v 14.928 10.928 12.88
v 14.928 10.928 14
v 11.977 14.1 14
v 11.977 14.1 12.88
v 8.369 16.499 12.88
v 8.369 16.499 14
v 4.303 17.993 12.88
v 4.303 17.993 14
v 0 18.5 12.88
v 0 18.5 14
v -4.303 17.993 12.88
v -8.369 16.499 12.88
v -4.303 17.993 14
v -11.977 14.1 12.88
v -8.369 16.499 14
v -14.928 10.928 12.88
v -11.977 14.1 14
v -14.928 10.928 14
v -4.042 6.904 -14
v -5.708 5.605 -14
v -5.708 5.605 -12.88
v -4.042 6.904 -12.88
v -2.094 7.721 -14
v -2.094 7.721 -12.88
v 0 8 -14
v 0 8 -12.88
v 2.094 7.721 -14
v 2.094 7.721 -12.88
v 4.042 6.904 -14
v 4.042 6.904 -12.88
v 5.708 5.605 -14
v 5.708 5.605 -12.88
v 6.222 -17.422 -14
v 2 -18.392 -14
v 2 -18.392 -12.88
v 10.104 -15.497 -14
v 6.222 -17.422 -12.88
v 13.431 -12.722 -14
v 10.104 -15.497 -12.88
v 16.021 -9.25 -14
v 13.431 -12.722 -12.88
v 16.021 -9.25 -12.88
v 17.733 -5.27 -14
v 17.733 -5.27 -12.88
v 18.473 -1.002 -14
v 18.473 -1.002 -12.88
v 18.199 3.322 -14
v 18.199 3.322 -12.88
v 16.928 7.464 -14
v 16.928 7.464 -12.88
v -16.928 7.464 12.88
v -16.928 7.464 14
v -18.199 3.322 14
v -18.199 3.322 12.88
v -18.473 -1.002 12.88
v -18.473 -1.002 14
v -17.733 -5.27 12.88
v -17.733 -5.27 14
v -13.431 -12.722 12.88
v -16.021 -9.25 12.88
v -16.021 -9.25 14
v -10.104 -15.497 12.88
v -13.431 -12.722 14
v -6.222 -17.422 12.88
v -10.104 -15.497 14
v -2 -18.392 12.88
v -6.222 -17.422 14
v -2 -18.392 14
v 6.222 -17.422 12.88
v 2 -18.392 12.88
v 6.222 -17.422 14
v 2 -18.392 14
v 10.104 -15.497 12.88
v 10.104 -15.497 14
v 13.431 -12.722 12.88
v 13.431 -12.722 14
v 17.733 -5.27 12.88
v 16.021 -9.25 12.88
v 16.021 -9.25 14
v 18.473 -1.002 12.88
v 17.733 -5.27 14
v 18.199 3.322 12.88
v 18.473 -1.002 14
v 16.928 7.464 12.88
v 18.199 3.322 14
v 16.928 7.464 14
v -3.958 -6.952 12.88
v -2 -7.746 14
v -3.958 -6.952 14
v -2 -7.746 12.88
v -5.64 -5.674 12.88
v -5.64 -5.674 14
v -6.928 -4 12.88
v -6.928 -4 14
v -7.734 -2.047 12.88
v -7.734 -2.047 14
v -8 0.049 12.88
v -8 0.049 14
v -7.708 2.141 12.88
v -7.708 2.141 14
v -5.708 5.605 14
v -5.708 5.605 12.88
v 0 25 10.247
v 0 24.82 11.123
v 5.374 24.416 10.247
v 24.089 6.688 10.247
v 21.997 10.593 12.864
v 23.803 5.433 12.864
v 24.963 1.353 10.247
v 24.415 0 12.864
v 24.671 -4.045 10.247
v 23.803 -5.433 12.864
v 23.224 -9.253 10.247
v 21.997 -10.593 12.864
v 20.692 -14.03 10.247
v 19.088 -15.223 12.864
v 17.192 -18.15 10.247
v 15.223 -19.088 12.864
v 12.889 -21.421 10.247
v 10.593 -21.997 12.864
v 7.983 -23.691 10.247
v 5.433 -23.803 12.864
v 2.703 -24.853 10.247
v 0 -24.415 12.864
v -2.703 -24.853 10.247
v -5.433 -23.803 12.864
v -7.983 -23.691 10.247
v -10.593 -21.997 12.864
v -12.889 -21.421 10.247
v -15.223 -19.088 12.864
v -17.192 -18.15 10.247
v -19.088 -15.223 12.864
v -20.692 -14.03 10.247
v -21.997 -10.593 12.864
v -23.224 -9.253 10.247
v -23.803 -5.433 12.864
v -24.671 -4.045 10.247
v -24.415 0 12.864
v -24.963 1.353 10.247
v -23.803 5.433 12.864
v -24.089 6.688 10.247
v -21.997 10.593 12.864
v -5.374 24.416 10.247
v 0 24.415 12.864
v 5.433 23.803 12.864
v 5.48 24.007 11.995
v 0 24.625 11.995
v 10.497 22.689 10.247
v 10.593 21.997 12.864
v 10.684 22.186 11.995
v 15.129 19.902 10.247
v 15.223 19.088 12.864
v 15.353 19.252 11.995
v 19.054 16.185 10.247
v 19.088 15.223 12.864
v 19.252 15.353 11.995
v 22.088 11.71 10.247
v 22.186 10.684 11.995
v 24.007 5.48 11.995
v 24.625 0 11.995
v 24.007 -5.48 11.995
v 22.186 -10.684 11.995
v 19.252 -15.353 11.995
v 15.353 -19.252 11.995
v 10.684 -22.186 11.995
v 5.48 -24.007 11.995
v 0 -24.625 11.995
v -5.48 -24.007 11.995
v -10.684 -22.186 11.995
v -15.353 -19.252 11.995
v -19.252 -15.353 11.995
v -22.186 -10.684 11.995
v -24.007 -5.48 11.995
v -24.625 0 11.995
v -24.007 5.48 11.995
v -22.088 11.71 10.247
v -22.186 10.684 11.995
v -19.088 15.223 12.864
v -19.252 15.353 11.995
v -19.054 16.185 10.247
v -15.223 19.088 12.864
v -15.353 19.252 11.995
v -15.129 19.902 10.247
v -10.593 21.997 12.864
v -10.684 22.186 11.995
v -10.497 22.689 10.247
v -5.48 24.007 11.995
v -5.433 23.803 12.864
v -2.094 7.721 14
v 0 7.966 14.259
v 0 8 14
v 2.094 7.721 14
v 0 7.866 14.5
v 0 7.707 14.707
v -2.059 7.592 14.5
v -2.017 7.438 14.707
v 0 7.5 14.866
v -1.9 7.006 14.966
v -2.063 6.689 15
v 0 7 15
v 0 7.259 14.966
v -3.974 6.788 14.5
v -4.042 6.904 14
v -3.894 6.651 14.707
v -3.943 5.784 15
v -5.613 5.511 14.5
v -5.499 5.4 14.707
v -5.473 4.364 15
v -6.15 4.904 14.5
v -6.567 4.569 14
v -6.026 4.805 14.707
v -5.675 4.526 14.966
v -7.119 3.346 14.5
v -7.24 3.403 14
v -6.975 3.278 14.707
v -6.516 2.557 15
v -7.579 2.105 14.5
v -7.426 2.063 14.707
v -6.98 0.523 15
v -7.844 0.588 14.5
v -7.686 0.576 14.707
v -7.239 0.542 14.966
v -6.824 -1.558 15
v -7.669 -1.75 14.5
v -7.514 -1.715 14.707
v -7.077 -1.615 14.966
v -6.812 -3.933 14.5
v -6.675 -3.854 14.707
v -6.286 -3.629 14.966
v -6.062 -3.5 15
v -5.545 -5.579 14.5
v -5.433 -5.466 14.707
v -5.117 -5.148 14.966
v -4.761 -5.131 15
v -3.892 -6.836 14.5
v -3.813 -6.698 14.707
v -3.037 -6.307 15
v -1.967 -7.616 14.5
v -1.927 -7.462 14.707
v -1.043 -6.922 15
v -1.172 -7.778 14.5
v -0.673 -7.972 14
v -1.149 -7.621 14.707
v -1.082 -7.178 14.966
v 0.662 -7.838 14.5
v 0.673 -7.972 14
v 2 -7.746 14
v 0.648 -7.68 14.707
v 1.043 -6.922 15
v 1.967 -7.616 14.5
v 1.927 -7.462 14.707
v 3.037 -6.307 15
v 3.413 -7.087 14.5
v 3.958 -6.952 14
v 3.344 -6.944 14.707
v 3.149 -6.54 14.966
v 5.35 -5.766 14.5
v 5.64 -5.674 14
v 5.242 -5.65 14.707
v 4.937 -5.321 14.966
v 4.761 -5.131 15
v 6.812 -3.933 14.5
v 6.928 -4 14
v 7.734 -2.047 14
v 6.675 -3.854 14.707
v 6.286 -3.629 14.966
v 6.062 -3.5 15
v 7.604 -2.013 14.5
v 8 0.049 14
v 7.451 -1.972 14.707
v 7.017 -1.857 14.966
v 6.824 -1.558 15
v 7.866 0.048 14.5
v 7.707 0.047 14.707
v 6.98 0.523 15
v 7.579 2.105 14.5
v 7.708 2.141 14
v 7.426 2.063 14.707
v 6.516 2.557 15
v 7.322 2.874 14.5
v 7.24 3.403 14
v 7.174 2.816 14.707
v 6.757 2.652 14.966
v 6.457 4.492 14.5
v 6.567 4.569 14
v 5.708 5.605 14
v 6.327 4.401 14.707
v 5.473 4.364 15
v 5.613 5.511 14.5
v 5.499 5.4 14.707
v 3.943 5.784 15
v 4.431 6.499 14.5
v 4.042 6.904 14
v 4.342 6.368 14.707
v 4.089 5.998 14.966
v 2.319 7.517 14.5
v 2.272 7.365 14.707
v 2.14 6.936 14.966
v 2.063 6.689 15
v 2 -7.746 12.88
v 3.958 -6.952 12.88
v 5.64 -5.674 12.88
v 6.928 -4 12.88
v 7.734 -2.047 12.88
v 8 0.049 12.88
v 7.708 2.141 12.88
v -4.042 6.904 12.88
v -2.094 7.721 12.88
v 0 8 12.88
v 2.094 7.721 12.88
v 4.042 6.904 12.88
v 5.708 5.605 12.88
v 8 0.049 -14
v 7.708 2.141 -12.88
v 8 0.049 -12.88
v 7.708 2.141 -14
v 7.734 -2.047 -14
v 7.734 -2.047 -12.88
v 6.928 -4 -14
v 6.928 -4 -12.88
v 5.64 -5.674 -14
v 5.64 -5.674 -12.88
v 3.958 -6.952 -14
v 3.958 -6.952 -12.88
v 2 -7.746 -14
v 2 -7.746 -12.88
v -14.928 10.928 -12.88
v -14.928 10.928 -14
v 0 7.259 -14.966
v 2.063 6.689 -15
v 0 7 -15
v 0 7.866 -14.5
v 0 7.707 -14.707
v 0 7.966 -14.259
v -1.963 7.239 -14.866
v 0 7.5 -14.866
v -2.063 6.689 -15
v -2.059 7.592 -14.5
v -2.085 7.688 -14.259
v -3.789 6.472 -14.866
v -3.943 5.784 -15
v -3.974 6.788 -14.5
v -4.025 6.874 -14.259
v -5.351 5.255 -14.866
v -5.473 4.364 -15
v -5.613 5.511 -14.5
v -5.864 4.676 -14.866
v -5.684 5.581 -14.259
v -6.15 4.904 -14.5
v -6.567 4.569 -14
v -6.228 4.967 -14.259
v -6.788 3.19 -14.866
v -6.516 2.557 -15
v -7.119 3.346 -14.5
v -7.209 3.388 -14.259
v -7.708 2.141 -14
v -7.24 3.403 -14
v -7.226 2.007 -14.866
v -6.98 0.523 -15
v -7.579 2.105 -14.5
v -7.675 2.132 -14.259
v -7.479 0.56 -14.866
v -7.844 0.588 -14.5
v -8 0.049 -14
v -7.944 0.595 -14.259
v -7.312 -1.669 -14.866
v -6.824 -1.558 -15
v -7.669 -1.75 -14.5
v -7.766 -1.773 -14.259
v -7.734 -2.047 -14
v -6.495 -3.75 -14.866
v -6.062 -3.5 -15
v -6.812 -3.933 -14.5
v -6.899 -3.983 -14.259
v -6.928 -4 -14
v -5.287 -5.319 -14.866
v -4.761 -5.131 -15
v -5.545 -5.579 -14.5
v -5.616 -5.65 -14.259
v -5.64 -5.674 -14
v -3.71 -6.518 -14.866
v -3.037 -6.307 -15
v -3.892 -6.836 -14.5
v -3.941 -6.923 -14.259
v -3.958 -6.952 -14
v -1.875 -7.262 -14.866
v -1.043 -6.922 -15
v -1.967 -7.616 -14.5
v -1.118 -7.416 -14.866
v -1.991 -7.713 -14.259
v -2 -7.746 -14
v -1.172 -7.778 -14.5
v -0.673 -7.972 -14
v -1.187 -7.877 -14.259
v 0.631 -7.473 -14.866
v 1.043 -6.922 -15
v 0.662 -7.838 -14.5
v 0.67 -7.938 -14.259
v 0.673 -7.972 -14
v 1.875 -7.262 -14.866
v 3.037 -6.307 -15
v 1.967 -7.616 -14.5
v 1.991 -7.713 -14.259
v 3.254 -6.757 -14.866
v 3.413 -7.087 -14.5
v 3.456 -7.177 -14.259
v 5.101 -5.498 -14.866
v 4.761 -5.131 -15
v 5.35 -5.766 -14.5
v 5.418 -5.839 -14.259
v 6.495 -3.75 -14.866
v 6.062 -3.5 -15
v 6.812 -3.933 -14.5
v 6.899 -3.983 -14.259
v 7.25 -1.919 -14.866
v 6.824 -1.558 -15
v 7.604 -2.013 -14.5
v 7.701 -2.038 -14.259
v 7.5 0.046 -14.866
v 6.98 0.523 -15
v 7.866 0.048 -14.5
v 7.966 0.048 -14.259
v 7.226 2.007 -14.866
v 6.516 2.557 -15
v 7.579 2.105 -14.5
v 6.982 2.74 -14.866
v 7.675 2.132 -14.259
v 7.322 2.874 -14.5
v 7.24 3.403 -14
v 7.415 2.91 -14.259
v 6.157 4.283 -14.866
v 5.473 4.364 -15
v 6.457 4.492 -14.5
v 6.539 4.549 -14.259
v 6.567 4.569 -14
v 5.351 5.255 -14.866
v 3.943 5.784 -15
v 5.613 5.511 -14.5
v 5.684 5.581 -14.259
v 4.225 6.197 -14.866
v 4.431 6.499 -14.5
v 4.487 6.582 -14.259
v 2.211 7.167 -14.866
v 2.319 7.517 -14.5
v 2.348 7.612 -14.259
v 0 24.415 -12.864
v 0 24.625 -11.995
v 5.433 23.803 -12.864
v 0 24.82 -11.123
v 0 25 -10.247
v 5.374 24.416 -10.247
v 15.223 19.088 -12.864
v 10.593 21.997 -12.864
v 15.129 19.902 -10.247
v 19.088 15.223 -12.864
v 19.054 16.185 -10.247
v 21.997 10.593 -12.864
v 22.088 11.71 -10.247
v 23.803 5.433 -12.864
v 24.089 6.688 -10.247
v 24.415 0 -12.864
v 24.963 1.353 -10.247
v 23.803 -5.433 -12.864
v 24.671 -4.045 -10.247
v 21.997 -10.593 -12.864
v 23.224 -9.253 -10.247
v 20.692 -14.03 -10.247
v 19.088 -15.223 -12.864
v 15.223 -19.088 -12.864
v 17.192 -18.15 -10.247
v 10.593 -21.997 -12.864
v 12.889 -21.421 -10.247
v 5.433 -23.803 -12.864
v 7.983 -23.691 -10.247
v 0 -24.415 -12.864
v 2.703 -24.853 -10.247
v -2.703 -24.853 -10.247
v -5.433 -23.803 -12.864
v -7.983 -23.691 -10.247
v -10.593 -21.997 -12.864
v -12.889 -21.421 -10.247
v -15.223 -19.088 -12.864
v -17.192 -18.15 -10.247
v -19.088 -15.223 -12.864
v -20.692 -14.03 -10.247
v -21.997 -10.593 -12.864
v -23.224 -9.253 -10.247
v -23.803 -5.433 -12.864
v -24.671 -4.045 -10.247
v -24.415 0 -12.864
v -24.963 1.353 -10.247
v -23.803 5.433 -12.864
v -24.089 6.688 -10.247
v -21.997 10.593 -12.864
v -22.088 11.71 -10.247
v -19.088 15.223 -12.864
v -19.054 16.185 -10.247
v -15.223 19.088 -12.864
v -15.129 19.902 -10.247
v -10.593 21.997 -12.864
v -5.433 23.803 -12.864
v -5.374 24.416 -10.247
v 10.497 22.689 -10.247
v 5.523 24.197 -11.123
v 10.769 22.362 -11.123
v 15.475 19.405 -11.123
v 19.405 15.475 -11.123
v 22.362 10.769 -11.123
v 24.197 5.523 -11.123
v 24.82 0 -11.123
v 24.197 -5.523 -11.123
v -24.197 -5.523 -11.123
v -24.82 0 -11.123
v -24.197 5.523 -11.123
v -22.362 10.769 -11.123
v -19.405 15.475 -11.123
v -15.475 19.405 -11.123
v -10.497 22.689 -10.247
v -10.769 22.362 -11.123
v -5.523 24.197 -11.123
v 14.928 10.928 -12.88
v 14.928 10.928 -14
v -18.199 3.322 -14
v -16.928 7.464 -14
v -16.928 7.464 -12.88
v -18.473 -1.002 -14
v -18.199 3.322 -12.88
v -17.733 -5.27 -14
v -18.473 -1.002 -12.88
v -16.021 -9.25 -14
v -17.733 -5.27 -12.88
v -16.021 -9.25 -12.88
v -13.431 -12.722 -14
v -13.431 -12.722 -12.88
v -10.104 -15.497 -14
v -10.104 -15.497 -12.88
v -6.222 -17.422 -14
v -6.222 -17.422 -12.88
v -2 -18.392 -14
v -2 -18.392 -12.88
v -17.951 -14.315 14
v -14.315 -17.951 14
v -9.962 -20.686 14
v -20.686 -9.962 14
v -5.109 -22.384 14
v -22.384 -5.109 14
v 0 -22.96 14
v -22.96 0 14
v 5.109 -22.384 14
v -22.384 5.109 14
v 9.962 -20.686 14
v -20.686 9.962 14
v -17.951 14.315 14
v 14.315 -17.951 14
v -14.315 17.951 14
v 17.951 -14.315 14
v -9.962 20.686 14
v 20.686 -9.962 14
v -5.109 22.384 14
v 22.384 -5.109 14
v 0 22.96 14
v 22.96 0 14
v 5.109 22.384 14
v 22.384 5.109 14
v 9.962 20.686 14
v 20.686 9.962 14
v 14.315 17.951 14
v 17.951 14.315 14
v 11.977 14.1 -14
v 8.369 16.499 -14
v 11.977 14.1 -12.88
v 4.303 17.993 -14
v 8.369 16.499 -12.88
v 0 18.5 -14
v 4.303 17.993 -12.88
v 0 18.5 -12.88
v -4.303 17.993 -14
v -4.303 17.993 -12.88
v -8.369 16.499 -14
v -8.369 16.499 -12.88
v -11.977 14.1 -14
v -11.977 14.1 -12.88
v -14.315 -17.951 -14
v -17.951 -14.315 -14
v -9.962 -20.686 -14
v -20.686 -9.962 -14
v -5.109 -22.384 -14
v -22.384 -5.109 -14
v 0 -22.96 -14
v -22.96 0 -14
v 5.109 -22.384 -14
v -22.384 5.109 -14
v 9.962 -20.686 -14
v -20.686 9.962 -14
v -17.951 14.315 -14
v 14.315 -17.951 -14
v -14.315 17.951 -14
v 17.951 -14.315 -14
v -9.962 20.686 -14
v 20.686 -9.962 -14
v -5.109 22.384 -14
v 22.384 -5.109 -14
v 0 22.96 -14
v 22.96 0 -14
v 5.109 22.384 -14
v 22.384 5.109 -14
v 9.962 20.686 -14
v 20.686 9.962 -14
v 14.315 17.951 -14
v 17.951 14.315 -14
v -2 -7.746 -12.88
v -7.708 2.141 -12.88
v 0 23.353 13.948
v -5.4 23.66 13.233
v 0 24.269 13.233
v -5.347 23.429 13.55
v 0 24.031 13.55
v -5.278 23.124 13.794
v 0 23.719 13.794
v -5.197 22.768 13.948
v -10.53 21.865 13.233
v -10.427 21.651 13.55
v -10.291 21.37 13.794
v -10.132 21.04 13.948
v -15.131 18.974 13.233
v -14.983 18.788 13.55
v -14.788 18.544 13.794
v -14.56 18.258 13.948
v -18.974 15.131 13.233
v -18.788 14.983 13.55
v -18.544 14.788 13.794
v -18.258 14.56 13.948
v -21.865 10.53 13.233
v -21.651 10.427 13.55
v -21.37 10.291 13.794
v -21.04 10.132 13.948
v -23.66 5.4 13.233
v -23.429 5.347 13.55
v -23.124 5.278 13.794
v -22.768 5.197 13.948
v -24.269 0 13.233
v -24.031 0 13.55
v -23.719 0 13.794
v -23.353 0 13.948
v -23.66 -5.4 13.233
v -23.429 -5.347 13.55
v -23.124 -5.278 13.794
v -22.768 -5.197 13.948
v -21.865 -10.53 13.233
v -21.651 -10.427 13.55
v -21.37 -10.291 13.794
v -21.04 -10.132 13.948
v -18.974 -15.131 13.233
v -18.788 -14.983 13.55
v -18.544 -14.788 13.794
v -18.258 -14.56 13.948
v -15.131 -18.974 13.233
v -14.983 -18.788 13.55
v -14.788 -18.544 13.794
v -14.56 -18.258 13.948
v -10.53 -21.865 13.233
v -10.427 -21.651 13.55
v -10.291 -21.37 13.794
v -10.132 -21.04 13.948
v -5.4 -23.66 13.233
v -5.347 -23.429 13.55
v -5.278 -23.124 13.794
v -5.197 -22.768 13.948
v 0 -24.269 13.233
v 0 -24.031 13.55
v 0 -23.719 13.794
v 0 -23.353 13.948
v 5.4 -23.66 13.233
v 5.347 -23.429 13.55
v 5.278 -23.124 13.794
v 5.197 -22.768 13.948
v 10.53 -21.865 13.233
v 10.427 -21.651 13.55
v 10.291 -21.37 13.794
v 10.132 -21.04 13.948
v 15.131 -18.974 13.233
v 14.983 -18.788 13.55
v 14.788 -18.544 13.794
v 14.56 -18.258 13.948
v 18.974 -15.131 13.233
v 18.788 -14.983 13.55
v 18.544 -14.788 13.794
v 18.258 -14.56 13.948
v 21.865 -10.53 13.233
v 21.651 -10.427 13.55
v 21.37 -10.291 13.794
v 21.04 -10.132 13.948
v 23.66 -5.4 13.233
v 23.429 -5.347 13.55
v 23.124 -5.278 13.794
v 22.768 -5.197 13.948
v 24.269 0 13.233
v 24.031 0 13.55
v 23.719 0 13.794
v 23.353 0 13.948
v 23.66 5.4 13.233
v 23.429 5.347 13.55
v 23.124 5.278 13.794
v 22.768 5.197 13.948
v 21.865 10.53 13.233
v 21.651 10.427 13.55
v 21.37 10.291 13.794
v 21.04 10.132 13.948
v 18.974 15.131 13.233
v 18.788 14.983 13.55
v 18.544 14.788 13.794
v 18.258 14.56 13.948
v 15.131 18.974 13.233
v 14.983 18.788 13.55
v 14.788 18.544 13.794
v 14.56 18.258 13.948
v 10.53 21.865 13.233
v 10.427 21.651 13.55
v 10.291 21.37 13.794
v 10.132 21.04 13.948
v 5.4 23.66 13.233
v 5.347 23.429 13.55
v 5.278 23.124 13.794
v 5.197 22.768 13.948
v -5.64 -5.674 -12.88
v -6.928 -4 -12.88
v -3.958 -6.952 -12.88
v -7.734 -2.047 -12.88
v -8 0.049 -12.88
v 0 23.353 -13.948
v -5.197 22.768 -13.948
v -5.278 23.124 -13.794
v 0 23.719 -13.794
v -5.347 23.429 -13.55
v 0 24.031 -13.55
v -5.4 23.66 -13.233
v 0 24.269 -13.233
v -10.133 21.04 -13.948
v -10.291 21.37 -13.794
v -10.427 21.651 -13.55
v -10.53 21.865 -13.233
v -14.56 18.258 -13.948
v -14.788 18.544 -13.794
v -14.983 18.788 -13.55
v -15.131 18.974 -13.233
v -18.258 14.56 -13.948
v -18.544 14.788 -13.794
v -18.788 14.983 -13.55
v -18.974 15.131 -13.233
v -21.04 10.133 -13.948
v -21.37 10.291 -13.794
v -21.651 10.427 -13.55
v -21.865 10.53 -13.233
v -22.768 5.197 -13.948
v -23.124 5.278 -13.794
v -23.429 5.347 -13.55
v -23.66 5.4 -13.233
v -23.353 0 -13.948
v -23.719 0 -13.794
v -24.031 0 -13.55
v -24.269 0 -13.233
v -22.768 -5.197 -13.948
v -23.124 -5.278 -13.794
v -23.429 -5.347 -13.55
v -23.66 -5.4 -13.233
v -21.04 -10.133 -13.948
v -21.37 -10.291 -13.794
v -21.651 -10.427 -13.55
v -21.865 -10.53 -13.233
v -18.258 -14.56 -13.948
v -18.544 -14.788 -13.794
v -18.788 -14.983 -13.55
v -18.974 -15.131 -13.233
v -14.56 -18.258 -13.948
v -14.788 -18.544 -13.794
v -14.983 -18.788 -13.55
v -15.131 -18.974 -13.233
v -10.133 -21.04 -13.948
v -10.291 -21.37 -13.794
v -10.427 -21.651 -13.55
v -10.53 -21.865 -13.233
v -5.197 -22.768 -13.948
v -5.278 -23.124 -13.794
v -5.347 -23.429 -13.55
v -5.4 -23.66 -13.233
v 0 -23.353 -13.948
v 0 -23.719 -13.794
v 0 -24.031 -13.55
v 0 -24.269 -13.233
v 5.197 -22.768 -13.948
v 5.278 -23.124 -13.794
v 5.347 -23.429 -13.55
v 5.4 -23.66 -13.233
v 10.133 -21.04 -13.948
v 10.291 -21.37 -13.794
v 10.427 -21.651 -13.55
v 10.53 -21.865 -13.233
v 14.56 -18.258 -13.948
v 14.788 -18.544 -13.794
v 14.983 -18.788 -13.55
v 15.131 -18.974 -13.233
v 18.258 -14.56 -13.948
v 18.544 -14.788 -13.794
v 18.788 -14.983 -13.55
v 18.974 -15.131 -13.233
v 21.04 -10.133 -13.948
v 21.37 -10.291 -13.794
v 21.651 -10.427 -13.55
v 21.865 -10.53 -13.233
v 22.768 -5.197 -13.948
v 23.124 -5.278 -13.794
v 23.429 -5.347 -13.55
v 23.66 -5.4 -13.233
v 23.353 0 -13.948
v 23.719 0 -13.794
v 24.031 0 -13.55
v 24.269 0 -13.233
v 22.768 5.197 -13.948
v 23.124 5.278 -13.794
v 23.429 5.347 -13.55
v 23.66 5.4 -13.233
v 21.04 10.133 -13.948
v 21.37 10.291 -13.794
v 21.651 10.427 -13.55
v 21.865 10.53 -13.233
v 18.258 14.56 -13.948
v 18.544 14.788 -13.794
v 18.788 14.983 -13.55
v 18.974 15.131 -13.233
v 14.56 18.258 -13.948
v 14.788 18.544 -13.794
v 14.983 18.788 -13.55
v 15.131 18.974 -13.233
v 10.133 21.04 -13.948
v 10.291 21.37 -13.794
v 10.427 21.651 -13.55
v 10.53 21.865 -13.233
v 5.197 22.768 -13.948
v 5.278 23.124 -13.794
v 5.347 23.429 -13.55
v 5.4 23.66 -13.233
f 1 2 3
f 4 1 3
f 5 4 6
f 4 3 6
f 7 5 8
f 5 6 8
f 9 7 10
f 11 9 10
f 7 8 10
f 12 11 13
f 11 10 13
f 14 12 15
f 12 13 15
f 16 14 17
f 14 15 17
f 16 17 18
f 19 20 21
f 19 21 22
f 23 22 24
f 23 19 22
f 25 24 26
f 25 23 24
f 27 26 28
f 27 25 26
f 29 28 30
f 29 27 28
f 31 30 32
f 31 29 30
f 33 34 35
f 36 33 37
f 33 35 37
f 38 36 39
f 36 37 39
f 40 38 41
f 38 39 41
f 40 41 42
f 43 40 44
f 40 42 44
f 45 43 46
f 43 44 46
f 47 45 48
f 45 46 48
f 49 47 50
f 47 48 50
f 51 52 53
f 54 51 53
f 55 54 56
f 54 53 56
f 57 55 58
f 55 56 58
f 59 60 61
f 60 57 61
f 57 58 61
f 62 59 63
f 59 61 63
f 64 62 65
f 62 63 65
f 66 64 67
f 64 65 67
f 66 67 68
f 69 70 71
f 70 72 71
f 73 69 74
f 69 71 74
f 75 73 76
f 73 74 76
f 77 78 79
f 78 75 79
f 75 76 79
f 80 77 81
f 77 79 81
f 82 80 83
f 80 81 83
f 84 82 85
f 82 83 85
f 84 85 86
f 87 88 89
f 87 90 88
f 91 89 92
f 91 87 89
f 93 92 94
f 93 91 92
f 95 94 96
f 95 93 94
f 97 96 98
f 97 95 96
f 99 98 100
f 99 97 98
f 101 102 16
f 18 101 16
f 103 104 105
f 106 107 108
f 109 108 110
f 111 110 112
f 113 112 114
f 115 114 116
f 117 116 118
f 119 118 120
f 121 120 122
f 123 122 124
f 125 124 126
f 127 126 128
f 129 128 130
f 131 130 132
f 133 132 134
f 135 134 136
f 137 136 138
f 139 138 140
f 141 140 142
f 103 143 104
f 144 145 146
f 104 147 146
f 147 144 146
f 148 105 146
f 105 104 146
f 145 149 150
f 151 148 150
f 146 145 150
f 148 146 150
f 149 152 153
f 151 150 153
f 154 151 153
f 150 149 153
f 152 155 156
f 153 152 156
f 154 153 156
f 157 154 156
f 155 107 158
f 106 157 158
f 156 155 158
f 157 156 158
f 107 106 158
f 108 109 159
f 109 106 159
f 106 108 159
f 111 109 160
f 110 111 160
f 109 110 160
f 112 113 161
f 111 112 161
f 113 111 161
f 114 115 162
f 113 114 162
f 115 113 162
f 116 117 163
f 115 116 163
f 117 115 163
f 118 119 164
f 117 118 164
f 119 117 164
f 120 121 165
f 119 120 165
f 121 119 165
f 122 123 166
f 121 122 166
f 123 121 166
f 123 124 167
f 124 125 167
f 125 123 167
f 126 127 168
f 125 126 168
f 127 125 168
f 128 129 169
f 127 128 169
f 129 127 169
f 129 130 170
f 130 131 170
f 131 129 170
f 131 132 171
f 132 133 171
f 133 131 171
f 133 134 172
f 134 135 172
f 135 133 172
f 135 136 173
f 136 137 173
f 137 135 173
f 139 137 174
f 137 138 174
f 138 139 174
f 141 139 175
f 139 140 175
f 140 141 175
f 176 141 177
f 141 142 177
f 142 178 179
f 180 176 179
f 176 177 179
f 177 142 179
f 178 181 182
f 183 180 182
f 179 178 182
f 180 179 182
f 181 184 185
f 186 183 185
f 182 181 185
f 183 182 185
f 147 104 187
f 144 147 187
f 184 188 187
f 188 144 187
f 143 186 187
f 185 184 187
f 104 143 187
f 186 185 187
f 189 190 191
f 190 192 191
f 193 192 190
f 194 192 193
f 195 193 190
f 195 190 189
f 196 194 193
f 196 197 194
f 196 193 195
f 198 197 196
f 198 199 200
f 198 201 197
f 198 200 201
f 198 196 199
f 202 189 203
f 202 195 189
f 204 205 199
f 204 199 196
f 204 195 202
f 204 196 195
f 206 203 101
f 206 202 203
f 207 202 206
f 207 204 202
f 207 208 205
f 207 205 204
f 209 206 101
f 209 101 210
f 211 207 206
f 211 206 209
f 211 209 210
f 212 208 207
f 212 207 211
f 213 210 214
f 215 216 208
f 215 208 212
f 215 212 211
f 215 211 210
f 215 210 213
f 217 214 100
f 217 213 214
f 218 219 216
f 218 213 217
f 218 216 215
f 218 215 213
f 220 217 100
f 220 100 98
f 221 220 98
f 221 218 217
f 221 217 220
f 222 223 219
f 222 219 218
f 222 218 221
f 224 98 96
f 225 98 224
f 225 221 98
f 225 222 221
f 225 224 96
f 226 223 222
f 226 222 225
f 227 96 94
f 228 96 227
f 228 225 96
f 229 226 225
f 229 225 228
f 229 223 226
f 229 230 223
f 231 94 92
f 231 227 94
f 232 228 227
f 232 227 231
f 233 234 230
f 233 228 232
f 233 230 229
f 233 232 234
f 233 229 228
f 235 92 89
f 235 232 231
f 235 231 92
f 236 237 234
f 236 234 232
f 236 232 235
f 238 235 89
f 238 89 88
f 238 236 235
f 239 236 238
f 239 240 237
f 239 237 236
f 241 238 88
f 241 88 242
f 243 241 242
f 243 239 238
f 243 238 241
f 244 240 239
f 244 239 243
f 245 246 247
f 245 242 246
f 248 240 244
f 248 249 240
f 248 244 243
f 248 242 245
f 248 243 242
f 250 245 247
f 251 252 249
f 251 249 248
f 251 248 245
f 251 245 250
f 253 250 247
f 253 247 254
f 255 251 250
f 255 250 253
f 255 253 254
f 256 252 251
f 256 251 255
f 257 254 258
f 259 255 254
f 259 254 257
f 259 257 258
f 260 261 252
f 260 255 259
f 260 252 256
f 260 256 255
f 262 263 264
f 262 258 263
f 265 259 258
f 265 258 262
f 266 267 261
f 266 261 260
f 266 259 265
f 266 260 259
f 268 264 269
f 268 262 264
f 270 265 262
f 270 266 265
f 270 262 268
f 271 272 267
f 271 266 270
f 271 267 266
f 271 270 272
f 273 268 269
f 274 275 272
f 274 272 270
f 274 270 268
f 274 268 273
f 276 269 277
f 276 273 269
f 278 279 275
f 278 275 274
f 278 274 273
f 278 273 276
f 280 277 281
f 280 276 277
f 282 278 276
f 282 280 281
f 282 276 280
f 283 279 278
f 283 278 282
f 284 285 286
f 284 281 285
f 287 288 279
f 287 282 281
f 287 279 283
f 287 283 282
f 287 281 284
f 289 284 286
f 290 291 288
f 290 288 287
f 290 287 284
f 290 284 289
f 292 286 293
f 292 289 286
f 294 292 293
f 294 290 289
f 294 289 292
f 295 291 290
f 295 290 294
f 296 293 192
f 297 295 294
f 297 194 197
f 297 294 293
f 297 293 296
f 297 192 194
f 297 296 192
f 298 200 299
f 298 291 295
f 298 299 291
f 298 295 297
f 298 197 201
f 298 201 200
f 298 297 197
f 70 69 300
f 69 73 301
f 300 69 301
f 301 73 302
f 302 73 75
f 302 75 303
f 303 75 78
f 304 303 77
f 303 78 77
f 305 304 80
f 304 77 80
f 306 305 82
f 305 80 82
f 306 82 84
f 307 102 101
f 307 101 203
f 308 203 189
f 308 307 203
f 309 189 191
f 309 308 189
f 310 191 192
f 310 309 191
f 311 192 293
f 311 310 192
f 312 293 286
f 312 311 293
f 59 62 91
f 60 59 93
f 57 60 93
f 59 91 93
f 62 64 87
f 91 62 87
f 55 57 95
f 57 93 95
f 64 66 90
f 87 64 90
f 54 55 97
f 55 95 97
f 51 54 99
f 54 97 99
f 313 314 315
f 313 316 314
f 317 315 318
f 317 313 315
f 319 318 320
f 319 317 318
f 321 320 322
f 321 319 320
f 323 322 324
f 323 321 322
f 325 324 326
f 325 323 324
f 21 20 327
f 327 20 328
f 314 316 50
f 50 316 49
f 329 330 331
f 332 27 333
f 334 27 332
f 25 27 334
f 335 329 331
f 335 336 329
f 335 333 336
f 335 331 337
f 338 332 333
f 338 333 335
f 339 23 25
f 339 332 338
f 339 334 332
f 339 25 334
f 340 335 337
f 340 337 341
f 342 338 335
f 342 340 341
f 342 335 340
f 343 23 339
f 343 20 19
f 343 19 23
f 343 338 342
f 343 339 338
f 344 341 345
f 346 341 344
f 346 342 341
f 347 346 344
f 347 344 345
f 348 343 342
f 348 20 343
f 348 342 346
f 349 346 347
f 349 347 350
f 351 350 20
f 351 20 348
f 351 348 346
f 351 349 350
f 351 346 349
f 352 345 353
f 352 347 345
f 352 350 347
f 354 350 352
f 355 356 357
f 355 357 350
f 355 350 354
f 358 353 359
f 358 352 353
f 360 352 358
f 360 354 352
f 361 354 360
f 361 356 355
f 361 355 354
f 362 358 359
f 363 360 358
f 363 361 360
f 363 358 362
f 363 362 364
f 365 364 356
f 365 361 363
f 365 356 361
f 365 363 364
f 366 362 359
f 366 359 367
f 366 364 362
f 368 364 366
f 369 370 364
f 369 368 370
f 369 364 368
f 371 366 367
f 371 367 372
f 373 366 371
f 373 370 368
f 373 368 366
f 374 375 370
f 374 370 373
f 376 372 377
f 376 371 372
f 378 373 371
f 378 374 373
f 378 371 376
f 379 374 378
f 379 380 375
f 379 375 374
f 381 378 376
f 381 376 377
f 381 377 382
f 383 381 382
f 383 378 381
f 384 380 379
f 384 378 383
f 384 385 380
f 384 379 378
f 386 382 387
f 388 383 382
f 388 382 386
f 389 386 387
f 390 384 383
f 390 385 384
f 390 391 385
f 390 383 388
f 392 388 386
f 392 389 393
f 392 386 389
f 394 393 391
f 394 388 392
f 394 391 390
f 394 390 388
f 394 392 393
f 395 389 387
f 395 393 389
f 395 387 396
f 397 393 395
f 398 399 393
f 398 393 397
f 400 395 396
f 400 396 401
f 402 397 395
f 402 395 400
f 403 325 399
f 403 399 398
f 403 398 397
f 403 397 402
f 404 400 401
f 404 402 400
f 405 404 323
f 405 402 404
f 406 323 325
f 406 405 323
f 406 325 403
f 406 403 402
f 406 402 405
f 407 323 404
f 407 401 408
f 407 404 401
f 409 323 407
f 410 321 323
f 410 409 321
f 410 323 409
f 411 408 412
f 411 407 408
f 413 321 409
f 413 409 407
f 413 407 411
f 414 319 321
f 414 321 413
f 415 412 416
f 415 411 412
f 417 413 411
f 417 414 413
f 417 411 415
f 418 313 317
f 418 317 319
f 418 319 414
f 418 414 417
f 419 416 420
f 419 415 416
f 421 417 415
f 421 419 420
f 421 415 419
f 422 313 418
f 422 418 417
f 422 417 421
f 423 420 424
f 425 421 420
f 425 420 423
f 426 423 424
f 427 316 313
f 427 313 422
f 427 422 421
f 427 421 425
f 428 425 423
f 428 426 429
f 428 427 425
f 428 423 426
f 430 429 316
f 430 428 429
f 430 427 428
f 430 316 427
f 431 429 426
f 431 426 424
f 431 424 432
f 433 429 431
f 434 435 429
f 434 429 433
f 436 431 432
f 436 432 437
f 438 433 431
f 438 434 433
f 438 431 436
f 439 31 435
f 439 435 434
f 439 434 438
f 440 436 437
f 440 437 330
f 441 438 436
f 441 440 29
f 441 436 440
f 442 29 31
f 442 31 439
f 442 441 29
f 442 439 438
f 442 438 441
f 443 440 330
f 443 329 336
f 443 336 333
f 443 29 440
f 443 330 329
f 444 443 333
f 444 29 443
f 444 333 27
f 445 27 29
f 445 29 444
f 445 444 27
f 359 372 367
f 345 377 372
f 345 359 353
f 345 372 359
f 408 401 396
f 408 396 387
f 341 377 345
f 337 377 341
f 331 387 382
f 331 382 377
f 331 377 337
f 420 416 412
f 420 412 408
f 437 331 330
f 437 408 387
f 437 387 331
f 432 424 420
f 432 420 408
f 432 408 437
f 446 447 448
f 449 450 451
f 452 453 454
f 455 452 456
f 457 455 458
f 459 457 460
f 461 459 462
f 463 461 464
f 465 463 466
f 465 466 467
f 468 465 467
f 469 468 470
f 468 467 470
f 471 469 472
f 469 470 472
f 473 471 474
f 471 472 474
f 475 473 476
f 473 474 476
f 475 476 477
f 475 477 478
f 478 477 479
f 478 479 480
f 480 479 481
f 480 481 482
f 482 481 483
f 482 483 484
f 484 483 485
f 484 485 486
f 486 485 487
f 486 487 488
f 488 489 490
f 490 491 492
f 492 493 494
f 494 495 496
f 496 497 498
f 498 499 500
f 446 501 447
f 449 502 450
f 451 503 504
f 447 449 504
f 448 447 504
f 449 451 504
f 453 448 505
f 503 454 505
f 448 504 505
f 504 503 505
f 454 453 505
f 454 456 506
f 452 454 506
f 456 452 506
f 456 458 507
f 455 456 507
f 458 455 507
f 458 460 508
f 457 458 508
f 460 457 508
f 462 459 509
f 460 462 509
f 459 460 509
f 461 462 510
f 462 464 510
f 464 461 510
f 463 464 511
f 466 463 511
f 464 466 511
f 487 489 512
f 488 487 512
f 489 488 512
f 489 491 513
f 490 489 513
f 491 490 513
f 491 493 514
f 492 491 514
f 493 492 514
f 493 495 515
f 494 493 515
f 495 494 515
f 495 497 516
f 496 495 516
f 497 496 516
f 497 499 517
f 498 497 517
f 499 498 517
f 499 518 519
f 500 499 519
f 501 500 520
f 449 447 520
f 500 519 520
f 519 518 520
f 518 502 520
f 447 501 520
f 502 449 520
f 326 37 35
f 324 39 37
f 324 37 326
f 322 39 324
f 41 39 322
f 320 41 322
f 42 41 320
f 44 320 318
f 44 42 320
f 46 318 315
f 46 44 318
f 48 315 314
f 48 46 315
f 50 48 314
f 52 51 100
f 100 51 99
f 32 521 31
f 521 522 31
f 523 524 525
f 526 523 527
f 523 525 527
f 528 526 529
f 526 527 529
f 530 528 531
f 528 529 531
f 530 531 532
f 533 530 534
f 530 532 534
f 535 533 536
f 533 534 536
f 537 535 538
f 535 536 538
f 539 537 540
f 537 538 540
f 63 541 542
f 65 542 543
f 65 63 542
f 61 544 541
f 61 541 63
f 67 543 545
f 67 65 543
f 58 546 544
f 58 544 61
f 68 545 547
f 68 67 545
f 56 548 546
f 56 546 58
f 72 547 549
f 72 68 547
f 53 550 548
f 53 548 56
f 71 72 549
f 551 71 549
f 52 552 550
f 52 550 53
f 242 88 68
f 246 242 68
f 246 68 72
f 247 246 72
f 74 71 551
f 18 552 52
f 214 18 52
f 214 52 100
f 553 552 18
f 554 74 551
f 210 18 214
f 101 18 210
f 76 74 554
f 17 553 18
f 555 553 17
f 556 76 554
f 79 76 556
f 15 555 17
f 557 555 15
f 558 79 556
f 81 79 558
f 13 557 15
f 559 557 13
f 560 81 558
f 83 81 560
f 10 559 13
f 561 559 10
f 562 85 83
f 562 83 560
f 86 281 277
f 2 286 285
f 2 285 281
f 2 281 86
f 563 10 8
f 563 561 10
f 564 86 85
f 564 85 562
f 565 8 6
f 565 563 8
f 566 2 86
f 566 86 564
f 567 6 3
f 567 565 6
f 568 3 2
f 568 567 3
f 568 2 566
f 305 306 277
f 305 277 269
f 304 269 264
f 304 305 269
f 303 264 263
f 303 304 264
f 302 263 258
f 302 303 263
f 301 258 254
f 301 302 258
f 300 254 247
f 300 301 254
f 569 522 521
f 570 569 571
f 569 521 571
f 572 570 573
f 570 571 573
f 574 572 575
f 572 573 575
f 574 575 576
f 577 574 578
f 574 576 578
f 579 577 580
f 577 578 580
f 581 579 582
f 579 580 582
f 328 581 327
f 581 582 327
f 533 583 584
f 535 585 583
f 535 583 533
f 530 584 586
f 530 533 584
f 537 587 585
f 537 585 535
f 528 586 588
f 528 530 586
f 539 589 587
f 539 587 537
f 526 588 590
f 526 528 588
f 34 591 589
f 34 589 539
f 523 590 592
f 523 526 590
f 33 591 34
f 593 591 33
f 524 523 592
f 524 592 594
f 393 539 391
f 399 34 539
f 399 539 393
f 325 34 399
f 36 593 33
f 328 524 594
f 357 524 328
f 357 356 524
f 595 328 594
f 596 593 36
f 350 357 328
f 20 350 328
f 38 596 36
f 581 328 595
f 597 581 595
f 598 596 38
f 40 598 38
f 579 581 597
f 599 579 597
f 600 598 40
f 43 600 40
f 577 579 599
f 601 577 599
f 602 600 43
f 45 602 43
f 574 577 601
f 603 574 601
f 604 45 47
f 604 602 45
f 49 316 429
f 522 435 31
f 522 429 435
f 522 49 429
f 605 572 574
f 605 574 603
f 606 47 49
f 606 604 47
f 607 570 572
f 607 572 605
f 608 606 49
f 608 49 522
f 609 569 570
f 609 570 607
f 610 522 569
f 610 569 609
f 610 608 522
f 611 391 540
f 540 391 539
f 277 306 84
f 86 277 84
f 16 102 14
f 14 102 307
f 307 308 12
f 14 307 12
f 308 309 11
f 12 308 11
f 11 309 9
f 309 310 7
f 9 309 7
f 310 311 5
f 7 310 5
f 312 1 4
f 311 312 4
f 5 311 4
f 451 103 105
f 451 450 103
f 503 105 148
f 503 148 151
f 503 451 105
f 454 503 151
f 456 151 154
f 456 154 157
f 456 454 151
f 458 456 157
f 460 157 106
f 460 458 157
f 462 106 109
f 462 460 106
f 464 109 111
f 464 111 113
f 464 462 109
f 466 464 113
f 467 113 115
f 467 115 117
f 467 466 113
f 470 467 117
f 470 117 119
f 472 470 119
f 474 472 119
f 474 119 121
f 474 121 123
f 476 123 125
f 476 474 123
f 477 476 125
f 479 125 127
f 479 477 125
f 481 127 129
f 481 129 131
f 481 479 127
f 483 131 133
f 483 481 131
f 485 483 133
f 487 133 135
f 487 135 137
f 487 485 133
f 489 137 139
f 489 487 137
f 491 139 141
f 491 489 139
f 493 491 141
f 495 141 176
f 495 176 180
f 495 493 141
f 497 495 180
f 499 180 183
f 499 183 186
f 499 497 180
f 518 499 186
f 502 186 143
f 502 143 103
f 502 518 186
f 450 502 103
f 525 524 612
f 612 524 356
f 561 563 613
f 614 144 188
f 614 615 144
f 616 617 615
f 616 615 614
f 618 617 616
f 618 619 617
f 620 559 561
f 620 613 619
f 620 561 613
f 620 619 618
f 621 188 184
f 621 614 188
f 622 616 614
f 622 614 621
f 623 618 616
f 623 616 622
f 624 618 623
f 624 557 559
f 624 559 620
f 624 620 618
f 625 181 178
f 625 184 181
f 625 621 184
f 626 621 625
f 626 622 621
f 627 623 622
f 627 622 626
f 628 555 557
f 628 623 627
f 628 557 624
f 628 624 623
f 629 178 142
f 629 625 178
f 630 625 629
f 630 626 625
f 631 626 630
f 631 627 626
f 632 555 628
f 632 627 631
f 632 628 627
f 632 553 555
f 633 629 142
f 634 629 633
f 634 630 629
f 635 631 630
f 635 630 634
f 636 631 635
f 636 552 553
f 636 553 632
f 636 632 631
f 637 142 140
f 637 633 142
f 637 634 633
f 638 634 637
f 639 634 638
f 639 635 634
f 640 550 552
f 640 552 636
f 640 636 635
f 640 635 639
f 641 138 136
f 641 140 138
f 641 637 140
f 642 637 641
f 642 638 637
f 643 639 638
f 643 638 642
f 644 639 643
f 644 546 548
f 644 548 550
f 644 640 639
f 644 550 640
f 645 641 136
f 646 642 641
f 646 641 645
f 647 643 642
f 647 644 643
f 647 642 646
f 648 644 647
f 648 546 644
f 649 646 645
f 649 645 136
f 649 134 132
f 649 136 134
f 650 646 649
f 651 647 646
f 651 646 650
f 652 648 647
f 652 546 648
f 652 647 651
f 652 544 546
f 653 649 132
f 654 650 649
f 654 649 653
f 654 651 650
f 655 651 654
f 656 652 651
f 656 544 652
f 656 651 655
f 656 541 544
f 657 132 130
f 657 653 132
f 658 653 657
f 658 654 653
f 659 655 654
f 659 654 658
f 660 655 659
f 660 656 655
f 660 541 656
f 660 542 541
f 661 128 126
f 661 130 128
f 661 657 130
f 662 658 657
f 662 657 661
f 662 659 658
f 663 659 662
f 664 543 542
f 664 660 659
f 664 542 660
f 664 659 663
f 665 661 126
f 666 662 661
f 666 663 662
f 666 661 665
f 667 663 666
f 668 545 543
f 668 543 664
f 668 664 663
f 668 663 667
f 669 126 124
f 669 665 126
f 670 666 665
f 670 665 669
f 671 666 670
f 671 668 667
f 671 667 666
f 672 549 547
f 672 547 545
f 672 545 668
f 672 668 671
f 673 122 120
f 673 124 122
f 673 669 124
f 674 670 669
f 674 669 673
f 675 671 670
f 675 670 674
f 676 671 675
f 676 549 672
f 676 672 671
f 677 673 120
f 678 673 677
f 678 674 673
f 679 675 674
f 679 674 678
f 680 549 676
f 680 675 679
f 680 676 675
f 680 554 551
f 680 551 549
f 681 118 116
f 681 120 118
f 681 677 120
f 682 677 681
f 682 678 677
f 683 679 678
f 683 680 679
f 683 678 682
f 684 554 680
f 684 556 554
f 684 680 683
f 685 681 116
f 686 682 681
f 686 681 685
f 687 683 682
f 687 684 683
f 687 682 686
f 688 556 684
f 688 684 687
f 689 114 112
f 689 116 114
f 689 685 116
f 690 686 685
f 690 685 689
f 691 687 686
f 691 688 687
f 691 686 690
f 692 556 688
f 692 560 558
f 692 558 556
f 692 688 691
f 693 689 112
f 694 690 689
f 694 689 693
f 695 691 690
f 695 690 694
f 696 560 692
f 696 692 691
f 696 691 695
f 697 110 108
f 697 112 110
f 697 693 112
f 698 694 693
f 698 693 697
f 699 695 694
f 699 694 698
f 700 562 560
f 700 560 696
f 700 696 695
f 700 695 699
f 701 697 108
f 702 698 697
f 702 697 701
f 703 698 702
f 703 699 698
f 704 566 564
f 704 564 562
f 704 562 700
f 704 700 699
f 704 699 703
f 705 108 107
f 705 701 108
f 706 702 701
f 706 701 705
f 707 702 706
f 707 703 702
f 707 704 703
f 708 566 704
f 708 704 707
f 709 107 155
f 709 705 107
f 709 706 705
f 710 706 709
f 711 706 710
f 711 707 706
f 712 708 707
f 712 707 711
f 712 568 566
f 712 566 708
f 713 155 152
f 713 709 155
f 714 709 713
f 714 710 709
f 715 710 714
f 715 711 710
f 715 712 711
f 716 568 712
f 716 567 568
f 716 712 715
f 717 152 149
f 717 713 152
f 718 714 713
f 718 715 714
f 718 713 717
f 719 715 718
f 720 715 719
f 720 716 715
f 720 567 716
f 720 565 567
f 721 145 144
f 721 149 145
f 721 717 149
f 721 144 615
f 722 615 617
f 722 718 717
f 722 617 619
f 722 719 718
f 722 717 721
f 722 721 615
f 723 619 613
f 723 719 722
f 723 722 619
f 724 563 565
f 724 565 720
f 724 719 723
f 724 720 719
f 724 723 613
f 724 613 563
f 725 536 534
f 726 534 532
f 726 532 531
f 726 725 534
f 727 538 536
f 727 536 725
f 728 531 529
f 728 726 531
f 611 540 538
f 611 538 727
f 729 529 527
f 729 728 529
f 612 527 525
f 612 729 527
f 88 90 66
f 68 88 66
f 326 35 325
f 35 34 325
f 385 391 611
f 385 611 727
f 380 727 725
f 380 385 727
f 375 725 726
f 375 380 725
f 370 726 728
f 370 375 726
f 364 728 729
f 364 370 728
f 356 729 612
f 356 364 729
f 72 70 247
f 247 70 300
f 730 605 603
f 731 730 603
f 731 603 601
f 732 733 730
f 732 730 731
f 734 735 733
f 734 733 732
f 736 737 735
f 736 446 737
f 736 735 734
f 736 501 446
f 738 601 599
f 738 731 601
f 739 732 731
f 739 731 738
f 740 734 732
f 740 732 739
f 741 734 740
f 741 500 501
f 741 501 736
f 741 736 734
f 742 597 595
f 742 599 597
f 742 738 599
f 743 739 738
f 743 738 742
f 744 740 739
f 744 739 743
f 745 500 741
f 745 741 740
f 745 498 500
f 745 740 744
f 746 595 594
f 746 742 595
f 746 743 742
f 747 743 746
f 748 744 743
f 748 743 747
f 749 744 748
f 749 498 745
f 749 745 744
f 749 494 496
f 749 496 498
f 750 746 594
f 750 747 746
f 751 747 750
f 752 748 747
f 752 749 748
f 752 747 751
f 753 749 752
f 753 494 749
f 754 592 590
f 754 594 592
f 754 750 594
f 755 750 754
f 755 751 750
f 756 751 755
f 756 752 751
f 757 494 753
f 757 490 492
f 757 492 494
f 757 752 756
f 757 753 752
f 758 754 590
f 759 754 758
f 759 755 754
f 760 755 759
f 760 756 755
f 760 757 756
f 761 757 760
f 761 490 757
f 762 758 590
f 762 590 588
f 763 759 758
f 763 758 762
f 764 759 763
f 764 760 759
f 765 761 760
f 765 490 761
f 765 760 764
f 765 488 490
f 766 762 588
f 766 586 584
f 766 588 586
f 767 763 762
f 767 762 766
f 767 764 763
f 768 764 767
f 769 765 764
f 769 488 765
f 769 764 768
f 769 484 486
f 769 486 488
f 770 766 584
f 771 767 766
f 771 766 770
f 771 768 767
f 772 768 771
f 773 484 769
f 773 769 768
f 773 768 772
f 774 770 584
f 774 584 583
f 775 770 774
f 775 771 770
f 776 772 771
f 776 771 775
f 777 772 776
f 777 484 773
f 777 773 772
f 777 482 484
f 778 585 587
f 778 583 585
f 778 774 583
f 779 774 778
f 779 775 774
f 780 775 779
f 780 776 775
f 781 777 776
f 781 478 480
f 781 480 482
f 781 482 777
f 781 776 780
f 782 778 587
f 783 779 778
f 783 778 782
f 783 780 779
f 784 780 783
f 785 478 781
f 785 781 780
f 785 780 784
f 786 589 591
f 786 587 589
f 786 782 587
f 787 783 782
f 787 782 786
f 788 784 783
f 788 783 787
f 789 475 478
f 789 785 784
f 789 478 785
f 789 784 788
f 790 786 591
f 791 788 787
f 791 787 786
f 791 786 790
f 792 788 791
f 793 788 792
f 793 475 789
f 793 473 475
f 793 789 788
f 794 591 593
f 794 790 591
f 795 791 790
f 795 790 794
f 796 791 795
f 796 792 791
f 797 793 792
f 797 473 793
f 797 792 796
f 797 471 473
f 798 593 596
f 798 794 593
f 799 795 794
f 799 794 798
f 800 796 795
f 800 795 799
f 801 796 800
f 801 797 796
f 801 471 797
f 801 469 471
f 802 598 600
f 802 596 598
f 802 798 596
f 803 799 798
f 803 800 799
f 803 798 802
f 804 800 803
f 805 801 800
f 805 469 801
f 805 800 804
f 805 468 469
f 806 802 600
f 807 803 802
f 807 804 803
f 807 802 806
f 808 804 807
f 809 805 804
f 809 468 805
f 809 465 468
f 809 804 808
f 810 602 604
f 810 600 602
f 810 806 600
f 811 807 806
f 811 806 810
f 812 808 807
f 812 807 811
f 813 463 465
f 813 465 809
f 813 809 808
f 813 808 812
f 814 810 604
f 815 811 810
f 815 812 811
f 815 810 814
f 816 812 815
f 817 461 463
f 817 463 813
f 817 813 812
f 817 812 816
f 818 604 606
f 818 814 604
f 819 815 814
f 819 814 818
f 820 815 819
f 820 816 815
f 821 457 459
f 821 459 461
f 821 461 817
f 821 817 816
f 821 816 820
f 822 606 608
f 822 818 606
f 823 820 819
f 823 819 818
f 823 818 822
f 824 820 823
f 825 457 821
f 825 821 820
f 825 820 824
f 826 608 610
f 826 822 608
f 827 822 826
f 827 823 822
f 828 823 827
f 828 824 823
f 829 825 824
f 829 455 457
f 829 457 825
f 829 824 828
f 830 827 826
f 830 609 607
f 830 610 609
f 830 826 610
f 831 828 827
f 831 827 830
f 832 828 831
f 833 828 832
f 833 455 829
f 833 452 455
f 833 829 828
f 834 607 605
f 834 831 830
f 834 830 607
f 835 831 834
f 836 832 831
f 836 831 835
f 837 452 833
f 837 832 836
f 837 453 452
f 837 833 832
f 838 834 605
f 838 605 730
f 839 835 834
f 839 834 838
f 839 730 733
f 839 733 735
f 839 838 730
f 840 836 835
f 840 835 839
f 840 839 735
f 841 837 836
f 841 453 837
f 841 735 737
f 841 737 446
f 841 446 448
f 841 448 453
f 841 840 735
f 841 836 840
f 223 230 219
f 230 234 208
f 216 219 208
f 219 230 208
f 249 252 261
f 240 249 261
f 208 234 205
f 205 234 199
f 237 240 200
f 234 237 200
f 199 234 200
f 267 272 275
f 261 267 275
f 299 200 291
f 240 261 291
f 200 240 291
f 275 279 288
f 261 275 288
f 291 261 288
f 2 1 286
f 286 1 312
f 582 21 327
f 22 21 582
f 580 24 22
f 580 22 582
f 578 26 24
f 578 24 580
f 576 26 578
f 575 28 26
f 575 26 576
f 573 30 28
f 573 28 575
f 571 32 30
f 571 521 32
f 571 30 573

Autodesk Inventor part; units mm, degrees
sketch "Sketch_1" plane through (0, 0, 0) normal (1, 0, 0) x (0, 1, 0)
  line L0 (0, -14) -> (0, 14)
  line L1 (0, 15) -> (7, 15)
  arc A0 (8, 14) -> (7, 15) centre (7, 14) ccw
  line L2 (8, 14) -> (8, 12.88)
  line L3 (8, 12.88) -> (18.5, 12.88)
  line L4 (18.5, 12.88) -> (18.5, 14)
  line L5 (18.5, 14) -> (22.96, 14)
  arc A1 (24.4151, 12.8641) -> (22.96, 14) centre (22.96, 12.5) ccw
  arc A2 (25, 10.247) -> (24.4151, 12.8641) centre (-27, 0) ccw
  line L6 (25, 10.247) -> (25, -10.247)
  arc A3 (24.4151, -12.8641) -> (25, -10.247) centre (-27, 0) ccw
  arc A4 (22.96, -14) -> (24.4151, -12.8641) centre (22.96, -12.5) ccw
  line L7 (22.96, -14) -> (18.5, -14)
  line L8 (18.5, -14) -> (18.5, -12.88)
  line L9 (18.5, -12.88) -> (8, -12.88)
  line L10 (8, -12.88) -> (8, -14)
  arc A5 (7, -15) -> (8, -14) centre (7, -14) ccw
  line L11 (7, -15) -> (0, -15)
  line L12 (0, -15) -> (0, 15)
revolve "Revolution1" add sketch "Sketch_1" angle 360 about axis through (0, 0, -14) along (0, 0, -1)
sketch "Sketch_5" plane through (0, 0, 0) normal (0, 0, 1) x (1, 0, 0)
  line L0 (-16.9276, 7.4637) -> (-4, 0)
  arc A0 (-4, 0) -> (-2, -3.4641) centre (0, 0) ccw
  line L1 (-2, -3.4641) -> (-2, -18.3916)
  arc A1 (-2, -18.3916) -> (2, -18.3916) centre (0, 0) ccw
  line L2 (2, -18.3916) -> (2, -3.4641)
  arc A2 (2, -3.4641) -> (4, 0) centre (0, 0) ccw
  line L3 (4, 0) -> (16.9276, 7.4637)
  arc A3 (16.9276, 7.4637) -> (14.9276, 10.9278) centre (0, 0) ccw
  line L4 (14.9276, 10.9278) -> (2, 3.4641)
  arc A4 (2, 3.4641) -> (-2, 3.4641) centre (0, 0) ccw
  line L5 (-2, 3.4641) -> (-14.9276, 10.9278)
  arc A5 (-14.9276, 10.9278) -> (-16.9276, 7.4637) centre (0, 0) ccw
extrude "Extrusion1" add sketch "Sketch_5" along normal mid plane 28
ref_plane "wheel_to_body_XY" through (0, 0, 0) normal (0, 0, 1) x (1, 0, 0)
ref_plane "wheel_to_body_YZ" through (0, 0, 0) normal (1, 0, 0) x (0, 1, 0)
ref_plane "wheel_to_body_ZX" through (0, 0, 0) normal (0, 1, 0) x (0, 0, 1)
properties part number "WHEEL-HSMCS50-N"
